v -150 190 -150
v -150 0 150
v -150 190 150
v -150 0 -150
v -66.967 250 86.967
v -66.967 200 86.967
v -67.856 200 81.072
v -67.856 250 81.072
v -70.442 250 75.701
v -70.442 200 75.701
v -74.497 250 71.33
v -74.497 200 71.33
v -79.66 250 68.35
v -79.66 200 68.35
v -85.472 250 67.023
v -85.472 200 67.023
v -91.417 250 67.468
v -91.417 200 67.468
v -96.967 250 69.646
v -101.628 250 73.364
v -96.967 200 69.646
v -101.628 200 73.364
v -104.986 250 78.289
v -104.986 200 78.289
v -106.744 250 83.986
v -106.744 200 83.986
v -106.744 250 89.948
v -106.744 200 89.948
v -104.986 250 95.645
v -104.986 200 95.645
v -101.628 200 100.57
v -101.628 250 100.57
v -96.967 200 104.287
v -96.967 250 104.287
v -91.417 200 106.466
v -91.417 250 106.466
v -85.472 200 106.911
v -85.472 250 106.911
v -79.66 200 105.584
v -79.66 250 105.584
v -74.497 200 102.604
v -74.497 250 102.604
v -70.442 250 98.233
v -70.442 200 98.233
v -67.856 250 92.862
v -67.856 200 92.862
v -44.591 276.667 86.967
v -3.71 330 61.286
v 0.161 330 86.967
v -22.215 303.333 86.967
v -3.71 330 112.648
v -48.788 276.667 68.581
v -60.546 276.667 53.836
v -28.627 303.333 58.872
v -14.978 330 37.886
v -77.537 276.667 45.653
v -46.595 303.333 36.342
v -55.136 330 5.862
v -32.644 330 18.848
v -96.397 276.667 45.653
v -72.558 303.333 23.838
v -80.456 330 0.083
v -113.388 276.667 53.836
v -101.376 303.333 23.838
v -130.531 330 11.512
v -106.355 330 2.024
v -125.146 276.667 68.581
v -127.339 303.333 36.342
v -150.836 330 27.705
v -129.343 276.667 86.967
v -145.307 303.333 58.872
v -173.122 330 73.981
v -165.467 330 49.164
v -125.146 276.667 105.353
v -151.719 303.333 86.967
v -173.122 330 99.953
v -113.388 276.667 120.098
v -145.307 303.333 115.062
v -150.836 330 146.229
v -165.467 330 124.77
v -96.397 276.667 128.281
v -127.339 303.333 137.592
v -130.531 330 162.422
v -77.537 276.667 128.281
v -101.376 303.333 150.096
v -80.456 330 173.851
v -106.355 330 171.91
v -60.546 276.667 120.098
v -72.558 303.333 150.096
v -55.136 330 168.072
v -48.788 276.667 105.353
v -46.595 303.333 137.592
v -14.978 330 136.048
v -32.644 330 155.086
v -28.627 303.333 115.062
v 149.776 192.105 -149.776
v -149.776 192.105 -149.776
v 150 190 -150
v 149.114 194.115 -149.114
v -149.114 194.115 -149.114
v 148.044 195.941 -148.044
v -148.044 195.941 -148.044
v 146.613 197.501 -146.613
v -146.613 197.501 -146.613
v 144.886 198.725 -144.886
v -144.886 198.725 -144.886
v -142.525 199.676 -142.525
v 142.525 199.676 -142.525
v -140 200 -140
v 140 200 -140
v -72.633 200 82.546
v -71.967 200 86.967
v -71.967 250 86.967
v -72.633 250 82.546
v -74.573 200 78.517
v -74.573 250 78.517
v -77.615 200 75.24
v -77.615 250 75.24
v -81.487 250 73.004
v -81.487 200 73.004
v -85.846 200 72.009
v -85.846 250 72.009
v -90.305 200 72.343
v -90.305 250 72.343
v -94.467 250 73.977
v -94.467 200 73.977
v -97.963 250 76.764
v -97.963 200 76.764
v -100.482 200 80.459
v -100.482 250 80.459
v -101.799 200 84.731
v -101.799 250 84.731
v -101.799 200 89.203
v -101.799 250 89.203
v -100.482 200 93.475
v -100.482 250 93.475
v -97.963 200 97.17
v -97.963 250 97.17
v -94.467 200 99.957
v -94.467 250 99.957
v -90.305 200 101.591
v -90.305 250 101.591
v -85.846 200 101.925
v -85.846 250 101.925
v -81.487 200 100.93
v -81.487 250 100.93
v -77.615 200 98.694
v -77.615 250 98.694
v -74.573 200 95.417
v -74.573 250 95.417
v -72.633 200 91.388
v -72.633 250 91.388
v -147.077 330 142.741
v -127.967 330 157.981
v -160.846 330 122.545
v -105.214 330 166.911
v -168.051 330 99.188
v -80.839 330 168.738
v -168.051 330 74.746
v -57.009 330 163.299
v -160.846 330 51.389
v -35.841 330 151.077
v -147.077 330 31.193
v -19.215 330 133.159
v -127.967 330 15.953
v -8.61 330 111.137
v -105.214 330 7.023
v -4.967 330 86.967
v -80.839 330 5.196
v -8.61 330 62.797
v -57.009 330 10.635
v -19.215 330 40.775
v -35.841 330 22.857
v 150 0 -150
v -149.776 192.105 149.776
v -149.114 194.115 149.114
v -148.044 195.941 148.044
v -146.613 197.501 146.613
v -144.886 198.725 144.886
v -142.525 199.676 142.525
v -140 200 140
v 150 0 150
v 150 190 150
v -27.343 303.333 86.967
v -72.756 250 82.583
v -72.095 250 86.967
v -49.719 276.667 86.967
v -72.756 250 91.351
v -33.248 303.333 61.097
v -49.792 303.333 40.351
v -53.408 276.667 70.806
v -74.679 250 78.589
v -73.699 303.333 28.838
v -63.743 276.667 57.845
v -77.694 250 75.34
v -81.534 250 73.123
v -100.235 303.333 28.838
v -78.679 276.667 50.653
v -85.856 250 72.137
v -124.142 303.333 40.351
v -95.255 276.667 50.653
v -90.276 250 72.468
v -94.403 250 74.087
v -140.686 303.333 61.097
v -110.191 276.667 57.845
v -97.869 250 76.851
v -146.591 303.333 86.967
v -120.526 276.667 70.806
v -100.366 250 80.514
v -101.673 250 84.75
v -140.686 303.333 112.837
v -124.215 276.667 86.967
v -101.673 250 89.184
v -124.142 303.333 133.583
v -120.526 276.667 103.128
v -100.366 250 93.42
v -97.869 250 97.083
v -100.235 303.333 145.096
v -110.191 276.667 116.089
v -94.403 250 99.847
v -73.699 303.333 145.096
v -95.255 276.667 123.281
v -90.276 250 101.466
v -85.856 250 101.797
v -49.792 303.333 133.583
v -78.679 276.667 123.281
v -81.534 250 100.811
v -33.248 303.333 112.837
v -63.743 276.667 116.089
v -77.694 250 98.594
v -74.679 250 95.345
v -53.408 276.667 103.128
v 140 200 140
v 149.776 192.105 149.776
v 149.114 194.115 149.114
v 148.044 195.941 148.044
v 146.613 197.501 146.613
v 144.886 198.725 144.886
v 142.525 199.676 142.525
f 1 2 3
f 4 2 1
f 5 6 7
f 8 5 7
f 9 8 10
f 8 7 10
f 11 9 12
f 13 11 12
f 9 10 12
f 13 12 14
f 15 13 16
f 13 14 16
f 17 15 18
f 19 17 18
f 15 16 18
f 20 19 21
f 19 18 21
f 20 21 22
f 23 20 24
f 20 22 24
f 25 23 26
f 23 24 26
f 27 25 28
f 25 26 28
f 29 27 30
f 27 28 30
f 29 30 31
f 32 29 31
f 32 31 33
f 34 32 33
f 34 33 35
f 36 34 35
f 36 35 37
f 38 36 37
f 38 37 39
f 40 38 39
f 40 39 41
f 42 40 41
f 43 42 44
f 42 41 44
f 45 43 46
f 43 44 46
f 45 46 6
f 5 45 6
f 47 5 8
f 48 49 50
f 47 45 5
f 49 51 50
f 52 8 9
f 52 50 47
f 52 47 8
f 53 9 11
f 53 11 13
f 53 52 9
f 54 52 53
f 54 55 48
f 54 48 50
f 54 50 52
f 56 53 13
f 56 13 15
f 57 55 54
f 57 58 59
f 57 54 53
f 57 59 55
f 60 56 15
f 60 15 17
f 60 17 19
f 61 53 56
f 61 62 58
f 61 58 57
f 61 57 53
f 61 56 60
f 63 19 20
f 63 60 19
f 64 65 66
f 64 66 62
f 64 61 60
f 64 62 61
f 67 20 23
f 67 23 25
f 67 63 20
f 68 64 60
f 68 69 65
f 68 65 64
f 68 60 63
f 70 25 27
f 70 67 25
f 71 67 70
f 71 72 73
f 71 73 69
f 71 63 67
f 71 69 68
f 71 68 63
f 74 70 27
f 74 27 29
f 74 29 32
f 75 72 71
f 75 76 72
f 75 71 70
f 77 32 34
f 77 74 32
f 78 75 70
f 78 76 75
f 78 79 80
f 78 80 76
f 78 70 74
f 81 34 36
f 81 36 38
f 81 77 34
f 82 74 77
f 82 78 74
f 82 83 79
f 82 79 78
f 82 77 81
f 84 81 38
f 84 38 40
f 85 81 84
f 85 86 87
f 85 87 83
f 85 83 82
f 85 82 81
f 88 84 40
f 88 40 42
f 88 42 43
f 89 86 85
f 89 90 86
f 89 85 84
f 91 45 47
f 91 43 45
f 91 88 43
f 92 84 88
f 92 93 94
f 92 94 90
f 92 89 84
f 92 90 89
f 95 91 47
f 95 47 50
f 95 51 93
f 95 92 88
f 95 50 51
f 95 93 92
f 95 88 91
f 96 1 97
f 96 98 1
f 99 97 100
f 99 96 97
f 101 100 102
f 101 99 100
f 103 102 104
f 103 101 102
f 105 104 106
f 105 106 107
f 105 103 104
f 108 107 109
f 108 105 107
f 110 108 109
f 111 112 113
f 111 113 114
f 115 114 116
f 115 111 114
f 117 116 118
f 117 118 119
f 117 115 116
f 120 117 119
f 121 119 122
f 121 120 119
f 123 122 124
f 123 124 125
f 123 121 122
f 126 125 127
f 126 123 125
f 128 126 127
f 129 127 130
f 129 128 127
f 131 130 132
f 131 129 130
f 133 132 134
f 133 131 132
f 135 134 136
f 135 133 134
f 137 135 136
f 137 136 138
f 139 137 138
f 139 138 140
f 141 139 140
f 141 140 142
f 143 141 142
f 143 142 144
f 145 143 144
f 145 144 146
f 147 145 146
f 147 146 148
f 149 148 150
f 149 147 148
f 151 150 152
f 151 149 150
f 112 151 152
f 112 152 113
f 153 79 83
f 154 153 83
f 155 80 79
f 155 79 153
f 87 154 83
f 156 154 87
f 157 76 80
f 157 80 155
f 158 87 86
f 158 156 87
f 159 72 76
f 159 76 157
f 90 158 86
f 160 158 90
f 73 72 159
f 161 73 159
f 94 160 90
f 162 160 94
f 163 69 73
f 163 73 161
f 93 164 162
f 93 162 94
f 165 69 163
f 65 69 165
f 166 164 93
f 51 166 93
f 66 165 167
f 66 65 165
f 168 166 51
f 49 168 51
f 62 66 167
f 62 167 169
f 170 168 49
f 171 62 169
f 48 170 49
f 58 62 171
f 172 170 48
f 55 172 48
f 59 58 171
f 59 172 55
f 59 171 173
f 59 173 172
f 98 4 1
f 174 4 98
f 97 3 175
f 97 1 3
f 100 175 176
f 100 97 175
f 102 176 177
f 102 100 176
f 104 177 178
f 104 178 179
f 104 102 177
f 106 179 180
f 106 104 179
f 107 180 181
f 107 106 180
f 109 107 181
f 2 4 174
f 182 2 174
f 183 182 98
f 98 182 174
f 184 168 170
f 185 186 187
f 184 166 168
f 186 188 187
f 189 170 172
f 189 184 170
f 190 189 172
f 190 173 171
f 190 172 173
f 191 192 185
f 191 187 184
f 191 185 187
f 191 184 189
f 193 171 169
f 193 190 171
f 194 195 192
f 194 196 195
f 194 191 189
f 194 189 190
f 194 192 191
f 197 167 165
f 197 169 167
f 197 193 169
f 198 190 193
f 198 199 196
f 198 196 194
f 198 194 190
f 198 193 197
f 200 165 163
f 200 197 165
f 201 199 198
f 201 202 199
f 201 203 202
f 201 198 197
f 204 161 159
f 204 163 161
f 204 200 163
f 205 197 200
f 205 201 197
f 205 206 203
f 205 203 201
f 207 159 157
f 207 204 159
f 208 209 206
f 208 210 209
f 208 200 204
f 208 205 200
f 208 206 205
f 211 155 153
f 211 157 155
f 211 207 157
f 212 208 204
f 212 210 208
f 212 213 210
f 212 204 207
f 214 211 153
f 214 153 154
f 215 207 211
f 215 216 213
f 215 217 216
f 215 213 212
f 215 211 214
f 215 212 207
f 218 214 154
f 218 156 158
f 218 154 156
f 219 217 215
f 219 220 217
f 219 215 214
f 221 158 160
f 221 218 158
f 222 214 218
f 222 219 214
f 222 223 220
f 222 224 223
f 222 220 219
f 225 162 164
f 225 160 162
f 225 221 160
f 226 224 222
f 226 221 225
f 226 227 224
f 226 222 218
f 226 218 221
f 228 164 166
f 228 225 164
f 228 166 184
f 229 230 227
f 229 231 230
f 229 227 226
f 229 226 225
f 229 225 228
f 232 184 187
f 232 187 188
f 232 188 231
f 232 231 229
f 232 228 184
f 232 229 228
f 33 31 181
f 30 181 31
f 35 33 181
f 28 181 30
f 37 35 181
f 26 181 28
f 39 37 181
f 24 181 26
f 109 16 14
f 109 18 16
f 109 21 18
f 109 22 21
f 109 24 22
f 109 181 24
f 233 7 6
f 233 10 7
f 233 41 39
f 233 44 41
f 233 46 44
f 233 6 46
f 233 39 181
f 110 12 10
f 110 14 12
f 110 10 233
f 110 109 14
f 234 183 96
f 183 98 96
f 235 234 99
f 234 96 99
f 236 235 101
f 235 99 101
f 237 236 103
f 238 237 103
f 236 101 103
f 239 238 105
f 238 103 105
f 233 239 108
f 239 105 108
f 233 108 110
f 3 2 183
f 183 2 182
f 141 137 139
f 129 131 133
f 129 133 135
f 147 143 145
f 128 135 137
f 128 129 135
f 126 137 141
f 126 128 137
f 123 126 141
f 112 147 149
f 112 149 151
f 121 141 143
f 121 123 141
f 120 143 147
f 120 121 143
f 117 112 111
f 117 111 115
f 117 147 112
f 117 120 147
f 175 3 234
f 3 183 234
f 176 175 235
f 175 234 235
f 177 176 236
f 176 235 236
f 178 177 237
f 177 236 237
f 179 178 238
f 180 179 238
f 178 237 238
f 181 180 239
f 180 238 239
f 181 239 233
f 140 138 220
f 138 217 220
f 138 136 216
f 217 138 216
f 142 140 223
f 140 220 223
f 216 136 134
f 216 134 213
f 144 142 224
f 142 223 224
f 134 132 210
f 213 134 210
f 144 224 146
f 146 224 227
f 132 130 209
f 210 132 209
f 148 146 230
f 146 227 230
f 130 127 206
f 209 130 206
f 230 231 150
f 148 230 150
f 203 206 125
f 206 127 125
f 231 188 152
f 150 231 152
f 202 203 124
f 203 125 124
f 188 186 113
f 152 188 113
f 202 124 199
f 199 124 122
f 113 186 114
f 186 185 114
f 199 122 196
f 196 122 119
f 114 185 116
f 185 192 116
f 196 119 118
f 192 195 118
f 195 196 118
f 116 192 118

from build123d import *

# Parameters (mm, degrees)
SKETCH1_W           = 300
SKETCH1_H           = 300
BOSS_EXTRUDE1_DEPTH = 200
FILLET1_R           = 10
SKETCH2_R           = 20
SKETCH2_R_2         = 15
BOSS_EXTRUDE2_DEPTH = 50
SKETCH3_R           = 20
BOSS_EXTRUDE3_DEPTH = 80
BOSS_EXTRUDE3_TAPER = -40
SKETCH4_R           = 82
CUT_EXTRUDE1_DEPTH  = 80
CUT_EXTRUDE1_TAPER  = 40


with BuildPart() as part:
    # Sketch1 → Boss-Extrude1 (new body)
    with BuildSketch(Plane(origin=(0, 0, 0), x_dir=(1, 0, 0), z_dir=(0, 1, 0))):
        Rectangle(SKETCH1_W, SKETCH1_H)
    extrude(amount=BOSS_EXTRUDE1_DEPTH)

    # Fillet1
    fillet1_edges = [part.edges().sort_by_distance(p)[0] for p in [
        (-150, 200, 0),
        (0, 200, 150),
        (150, 200, 0),
        (0, 200, -150),
    ]]
    fillet(fillet1_edges, radius=FILLET1_R)

    # Sketch2 → Boss-Extrude2 (add)
    with BuildSketch(Plane(origin=(0, 200, 0), x_dir=(1, 0, 0), z_dir=(0, 1, 0))):
        with Locations((-86.966991411, -86.966991411)):
            Circle(SKETCH2_R)
        with Locations((-86.966991411, -86.966991411)):
            Circle(SKETCH2_R_2, mode=Mode.SUBTRACT)
    extrude(amount=BOSS_EXTRUDE2_DEPTH)

    # Sketch3 → Boss-Extrude3 (add)
    with BuildSketch(Plane(origin=(0, 250, 0), x_dir=(1, 0, 0), z_dir=(0, 1, 0))):
        with Locations((-86.966991411, -86.966991411)):
            Circle(SKETCH3_R)
    extrude(amount=BOSS_EXTRUDE3_DEPTH, taper=BOSS_EXTRUDE3_TAPER)

    # Sketch4 → Cut-Extrude1 (cut)
    with BuildSketch(Plane(origin=(0, 330, 0), x_dir=(1, 0, 0), z_dir=(0, 1, 0))):
        with Locations((-86.966991411, -86.966991411)):
            Circle(SKETCH4_R)
    extrude(amount=-CUT_EXTRUDE1_DEPTH, taper=CUT_EXTRUDE1_TAPER, mode=Mode.SUBTRACT)


solid = part.part
